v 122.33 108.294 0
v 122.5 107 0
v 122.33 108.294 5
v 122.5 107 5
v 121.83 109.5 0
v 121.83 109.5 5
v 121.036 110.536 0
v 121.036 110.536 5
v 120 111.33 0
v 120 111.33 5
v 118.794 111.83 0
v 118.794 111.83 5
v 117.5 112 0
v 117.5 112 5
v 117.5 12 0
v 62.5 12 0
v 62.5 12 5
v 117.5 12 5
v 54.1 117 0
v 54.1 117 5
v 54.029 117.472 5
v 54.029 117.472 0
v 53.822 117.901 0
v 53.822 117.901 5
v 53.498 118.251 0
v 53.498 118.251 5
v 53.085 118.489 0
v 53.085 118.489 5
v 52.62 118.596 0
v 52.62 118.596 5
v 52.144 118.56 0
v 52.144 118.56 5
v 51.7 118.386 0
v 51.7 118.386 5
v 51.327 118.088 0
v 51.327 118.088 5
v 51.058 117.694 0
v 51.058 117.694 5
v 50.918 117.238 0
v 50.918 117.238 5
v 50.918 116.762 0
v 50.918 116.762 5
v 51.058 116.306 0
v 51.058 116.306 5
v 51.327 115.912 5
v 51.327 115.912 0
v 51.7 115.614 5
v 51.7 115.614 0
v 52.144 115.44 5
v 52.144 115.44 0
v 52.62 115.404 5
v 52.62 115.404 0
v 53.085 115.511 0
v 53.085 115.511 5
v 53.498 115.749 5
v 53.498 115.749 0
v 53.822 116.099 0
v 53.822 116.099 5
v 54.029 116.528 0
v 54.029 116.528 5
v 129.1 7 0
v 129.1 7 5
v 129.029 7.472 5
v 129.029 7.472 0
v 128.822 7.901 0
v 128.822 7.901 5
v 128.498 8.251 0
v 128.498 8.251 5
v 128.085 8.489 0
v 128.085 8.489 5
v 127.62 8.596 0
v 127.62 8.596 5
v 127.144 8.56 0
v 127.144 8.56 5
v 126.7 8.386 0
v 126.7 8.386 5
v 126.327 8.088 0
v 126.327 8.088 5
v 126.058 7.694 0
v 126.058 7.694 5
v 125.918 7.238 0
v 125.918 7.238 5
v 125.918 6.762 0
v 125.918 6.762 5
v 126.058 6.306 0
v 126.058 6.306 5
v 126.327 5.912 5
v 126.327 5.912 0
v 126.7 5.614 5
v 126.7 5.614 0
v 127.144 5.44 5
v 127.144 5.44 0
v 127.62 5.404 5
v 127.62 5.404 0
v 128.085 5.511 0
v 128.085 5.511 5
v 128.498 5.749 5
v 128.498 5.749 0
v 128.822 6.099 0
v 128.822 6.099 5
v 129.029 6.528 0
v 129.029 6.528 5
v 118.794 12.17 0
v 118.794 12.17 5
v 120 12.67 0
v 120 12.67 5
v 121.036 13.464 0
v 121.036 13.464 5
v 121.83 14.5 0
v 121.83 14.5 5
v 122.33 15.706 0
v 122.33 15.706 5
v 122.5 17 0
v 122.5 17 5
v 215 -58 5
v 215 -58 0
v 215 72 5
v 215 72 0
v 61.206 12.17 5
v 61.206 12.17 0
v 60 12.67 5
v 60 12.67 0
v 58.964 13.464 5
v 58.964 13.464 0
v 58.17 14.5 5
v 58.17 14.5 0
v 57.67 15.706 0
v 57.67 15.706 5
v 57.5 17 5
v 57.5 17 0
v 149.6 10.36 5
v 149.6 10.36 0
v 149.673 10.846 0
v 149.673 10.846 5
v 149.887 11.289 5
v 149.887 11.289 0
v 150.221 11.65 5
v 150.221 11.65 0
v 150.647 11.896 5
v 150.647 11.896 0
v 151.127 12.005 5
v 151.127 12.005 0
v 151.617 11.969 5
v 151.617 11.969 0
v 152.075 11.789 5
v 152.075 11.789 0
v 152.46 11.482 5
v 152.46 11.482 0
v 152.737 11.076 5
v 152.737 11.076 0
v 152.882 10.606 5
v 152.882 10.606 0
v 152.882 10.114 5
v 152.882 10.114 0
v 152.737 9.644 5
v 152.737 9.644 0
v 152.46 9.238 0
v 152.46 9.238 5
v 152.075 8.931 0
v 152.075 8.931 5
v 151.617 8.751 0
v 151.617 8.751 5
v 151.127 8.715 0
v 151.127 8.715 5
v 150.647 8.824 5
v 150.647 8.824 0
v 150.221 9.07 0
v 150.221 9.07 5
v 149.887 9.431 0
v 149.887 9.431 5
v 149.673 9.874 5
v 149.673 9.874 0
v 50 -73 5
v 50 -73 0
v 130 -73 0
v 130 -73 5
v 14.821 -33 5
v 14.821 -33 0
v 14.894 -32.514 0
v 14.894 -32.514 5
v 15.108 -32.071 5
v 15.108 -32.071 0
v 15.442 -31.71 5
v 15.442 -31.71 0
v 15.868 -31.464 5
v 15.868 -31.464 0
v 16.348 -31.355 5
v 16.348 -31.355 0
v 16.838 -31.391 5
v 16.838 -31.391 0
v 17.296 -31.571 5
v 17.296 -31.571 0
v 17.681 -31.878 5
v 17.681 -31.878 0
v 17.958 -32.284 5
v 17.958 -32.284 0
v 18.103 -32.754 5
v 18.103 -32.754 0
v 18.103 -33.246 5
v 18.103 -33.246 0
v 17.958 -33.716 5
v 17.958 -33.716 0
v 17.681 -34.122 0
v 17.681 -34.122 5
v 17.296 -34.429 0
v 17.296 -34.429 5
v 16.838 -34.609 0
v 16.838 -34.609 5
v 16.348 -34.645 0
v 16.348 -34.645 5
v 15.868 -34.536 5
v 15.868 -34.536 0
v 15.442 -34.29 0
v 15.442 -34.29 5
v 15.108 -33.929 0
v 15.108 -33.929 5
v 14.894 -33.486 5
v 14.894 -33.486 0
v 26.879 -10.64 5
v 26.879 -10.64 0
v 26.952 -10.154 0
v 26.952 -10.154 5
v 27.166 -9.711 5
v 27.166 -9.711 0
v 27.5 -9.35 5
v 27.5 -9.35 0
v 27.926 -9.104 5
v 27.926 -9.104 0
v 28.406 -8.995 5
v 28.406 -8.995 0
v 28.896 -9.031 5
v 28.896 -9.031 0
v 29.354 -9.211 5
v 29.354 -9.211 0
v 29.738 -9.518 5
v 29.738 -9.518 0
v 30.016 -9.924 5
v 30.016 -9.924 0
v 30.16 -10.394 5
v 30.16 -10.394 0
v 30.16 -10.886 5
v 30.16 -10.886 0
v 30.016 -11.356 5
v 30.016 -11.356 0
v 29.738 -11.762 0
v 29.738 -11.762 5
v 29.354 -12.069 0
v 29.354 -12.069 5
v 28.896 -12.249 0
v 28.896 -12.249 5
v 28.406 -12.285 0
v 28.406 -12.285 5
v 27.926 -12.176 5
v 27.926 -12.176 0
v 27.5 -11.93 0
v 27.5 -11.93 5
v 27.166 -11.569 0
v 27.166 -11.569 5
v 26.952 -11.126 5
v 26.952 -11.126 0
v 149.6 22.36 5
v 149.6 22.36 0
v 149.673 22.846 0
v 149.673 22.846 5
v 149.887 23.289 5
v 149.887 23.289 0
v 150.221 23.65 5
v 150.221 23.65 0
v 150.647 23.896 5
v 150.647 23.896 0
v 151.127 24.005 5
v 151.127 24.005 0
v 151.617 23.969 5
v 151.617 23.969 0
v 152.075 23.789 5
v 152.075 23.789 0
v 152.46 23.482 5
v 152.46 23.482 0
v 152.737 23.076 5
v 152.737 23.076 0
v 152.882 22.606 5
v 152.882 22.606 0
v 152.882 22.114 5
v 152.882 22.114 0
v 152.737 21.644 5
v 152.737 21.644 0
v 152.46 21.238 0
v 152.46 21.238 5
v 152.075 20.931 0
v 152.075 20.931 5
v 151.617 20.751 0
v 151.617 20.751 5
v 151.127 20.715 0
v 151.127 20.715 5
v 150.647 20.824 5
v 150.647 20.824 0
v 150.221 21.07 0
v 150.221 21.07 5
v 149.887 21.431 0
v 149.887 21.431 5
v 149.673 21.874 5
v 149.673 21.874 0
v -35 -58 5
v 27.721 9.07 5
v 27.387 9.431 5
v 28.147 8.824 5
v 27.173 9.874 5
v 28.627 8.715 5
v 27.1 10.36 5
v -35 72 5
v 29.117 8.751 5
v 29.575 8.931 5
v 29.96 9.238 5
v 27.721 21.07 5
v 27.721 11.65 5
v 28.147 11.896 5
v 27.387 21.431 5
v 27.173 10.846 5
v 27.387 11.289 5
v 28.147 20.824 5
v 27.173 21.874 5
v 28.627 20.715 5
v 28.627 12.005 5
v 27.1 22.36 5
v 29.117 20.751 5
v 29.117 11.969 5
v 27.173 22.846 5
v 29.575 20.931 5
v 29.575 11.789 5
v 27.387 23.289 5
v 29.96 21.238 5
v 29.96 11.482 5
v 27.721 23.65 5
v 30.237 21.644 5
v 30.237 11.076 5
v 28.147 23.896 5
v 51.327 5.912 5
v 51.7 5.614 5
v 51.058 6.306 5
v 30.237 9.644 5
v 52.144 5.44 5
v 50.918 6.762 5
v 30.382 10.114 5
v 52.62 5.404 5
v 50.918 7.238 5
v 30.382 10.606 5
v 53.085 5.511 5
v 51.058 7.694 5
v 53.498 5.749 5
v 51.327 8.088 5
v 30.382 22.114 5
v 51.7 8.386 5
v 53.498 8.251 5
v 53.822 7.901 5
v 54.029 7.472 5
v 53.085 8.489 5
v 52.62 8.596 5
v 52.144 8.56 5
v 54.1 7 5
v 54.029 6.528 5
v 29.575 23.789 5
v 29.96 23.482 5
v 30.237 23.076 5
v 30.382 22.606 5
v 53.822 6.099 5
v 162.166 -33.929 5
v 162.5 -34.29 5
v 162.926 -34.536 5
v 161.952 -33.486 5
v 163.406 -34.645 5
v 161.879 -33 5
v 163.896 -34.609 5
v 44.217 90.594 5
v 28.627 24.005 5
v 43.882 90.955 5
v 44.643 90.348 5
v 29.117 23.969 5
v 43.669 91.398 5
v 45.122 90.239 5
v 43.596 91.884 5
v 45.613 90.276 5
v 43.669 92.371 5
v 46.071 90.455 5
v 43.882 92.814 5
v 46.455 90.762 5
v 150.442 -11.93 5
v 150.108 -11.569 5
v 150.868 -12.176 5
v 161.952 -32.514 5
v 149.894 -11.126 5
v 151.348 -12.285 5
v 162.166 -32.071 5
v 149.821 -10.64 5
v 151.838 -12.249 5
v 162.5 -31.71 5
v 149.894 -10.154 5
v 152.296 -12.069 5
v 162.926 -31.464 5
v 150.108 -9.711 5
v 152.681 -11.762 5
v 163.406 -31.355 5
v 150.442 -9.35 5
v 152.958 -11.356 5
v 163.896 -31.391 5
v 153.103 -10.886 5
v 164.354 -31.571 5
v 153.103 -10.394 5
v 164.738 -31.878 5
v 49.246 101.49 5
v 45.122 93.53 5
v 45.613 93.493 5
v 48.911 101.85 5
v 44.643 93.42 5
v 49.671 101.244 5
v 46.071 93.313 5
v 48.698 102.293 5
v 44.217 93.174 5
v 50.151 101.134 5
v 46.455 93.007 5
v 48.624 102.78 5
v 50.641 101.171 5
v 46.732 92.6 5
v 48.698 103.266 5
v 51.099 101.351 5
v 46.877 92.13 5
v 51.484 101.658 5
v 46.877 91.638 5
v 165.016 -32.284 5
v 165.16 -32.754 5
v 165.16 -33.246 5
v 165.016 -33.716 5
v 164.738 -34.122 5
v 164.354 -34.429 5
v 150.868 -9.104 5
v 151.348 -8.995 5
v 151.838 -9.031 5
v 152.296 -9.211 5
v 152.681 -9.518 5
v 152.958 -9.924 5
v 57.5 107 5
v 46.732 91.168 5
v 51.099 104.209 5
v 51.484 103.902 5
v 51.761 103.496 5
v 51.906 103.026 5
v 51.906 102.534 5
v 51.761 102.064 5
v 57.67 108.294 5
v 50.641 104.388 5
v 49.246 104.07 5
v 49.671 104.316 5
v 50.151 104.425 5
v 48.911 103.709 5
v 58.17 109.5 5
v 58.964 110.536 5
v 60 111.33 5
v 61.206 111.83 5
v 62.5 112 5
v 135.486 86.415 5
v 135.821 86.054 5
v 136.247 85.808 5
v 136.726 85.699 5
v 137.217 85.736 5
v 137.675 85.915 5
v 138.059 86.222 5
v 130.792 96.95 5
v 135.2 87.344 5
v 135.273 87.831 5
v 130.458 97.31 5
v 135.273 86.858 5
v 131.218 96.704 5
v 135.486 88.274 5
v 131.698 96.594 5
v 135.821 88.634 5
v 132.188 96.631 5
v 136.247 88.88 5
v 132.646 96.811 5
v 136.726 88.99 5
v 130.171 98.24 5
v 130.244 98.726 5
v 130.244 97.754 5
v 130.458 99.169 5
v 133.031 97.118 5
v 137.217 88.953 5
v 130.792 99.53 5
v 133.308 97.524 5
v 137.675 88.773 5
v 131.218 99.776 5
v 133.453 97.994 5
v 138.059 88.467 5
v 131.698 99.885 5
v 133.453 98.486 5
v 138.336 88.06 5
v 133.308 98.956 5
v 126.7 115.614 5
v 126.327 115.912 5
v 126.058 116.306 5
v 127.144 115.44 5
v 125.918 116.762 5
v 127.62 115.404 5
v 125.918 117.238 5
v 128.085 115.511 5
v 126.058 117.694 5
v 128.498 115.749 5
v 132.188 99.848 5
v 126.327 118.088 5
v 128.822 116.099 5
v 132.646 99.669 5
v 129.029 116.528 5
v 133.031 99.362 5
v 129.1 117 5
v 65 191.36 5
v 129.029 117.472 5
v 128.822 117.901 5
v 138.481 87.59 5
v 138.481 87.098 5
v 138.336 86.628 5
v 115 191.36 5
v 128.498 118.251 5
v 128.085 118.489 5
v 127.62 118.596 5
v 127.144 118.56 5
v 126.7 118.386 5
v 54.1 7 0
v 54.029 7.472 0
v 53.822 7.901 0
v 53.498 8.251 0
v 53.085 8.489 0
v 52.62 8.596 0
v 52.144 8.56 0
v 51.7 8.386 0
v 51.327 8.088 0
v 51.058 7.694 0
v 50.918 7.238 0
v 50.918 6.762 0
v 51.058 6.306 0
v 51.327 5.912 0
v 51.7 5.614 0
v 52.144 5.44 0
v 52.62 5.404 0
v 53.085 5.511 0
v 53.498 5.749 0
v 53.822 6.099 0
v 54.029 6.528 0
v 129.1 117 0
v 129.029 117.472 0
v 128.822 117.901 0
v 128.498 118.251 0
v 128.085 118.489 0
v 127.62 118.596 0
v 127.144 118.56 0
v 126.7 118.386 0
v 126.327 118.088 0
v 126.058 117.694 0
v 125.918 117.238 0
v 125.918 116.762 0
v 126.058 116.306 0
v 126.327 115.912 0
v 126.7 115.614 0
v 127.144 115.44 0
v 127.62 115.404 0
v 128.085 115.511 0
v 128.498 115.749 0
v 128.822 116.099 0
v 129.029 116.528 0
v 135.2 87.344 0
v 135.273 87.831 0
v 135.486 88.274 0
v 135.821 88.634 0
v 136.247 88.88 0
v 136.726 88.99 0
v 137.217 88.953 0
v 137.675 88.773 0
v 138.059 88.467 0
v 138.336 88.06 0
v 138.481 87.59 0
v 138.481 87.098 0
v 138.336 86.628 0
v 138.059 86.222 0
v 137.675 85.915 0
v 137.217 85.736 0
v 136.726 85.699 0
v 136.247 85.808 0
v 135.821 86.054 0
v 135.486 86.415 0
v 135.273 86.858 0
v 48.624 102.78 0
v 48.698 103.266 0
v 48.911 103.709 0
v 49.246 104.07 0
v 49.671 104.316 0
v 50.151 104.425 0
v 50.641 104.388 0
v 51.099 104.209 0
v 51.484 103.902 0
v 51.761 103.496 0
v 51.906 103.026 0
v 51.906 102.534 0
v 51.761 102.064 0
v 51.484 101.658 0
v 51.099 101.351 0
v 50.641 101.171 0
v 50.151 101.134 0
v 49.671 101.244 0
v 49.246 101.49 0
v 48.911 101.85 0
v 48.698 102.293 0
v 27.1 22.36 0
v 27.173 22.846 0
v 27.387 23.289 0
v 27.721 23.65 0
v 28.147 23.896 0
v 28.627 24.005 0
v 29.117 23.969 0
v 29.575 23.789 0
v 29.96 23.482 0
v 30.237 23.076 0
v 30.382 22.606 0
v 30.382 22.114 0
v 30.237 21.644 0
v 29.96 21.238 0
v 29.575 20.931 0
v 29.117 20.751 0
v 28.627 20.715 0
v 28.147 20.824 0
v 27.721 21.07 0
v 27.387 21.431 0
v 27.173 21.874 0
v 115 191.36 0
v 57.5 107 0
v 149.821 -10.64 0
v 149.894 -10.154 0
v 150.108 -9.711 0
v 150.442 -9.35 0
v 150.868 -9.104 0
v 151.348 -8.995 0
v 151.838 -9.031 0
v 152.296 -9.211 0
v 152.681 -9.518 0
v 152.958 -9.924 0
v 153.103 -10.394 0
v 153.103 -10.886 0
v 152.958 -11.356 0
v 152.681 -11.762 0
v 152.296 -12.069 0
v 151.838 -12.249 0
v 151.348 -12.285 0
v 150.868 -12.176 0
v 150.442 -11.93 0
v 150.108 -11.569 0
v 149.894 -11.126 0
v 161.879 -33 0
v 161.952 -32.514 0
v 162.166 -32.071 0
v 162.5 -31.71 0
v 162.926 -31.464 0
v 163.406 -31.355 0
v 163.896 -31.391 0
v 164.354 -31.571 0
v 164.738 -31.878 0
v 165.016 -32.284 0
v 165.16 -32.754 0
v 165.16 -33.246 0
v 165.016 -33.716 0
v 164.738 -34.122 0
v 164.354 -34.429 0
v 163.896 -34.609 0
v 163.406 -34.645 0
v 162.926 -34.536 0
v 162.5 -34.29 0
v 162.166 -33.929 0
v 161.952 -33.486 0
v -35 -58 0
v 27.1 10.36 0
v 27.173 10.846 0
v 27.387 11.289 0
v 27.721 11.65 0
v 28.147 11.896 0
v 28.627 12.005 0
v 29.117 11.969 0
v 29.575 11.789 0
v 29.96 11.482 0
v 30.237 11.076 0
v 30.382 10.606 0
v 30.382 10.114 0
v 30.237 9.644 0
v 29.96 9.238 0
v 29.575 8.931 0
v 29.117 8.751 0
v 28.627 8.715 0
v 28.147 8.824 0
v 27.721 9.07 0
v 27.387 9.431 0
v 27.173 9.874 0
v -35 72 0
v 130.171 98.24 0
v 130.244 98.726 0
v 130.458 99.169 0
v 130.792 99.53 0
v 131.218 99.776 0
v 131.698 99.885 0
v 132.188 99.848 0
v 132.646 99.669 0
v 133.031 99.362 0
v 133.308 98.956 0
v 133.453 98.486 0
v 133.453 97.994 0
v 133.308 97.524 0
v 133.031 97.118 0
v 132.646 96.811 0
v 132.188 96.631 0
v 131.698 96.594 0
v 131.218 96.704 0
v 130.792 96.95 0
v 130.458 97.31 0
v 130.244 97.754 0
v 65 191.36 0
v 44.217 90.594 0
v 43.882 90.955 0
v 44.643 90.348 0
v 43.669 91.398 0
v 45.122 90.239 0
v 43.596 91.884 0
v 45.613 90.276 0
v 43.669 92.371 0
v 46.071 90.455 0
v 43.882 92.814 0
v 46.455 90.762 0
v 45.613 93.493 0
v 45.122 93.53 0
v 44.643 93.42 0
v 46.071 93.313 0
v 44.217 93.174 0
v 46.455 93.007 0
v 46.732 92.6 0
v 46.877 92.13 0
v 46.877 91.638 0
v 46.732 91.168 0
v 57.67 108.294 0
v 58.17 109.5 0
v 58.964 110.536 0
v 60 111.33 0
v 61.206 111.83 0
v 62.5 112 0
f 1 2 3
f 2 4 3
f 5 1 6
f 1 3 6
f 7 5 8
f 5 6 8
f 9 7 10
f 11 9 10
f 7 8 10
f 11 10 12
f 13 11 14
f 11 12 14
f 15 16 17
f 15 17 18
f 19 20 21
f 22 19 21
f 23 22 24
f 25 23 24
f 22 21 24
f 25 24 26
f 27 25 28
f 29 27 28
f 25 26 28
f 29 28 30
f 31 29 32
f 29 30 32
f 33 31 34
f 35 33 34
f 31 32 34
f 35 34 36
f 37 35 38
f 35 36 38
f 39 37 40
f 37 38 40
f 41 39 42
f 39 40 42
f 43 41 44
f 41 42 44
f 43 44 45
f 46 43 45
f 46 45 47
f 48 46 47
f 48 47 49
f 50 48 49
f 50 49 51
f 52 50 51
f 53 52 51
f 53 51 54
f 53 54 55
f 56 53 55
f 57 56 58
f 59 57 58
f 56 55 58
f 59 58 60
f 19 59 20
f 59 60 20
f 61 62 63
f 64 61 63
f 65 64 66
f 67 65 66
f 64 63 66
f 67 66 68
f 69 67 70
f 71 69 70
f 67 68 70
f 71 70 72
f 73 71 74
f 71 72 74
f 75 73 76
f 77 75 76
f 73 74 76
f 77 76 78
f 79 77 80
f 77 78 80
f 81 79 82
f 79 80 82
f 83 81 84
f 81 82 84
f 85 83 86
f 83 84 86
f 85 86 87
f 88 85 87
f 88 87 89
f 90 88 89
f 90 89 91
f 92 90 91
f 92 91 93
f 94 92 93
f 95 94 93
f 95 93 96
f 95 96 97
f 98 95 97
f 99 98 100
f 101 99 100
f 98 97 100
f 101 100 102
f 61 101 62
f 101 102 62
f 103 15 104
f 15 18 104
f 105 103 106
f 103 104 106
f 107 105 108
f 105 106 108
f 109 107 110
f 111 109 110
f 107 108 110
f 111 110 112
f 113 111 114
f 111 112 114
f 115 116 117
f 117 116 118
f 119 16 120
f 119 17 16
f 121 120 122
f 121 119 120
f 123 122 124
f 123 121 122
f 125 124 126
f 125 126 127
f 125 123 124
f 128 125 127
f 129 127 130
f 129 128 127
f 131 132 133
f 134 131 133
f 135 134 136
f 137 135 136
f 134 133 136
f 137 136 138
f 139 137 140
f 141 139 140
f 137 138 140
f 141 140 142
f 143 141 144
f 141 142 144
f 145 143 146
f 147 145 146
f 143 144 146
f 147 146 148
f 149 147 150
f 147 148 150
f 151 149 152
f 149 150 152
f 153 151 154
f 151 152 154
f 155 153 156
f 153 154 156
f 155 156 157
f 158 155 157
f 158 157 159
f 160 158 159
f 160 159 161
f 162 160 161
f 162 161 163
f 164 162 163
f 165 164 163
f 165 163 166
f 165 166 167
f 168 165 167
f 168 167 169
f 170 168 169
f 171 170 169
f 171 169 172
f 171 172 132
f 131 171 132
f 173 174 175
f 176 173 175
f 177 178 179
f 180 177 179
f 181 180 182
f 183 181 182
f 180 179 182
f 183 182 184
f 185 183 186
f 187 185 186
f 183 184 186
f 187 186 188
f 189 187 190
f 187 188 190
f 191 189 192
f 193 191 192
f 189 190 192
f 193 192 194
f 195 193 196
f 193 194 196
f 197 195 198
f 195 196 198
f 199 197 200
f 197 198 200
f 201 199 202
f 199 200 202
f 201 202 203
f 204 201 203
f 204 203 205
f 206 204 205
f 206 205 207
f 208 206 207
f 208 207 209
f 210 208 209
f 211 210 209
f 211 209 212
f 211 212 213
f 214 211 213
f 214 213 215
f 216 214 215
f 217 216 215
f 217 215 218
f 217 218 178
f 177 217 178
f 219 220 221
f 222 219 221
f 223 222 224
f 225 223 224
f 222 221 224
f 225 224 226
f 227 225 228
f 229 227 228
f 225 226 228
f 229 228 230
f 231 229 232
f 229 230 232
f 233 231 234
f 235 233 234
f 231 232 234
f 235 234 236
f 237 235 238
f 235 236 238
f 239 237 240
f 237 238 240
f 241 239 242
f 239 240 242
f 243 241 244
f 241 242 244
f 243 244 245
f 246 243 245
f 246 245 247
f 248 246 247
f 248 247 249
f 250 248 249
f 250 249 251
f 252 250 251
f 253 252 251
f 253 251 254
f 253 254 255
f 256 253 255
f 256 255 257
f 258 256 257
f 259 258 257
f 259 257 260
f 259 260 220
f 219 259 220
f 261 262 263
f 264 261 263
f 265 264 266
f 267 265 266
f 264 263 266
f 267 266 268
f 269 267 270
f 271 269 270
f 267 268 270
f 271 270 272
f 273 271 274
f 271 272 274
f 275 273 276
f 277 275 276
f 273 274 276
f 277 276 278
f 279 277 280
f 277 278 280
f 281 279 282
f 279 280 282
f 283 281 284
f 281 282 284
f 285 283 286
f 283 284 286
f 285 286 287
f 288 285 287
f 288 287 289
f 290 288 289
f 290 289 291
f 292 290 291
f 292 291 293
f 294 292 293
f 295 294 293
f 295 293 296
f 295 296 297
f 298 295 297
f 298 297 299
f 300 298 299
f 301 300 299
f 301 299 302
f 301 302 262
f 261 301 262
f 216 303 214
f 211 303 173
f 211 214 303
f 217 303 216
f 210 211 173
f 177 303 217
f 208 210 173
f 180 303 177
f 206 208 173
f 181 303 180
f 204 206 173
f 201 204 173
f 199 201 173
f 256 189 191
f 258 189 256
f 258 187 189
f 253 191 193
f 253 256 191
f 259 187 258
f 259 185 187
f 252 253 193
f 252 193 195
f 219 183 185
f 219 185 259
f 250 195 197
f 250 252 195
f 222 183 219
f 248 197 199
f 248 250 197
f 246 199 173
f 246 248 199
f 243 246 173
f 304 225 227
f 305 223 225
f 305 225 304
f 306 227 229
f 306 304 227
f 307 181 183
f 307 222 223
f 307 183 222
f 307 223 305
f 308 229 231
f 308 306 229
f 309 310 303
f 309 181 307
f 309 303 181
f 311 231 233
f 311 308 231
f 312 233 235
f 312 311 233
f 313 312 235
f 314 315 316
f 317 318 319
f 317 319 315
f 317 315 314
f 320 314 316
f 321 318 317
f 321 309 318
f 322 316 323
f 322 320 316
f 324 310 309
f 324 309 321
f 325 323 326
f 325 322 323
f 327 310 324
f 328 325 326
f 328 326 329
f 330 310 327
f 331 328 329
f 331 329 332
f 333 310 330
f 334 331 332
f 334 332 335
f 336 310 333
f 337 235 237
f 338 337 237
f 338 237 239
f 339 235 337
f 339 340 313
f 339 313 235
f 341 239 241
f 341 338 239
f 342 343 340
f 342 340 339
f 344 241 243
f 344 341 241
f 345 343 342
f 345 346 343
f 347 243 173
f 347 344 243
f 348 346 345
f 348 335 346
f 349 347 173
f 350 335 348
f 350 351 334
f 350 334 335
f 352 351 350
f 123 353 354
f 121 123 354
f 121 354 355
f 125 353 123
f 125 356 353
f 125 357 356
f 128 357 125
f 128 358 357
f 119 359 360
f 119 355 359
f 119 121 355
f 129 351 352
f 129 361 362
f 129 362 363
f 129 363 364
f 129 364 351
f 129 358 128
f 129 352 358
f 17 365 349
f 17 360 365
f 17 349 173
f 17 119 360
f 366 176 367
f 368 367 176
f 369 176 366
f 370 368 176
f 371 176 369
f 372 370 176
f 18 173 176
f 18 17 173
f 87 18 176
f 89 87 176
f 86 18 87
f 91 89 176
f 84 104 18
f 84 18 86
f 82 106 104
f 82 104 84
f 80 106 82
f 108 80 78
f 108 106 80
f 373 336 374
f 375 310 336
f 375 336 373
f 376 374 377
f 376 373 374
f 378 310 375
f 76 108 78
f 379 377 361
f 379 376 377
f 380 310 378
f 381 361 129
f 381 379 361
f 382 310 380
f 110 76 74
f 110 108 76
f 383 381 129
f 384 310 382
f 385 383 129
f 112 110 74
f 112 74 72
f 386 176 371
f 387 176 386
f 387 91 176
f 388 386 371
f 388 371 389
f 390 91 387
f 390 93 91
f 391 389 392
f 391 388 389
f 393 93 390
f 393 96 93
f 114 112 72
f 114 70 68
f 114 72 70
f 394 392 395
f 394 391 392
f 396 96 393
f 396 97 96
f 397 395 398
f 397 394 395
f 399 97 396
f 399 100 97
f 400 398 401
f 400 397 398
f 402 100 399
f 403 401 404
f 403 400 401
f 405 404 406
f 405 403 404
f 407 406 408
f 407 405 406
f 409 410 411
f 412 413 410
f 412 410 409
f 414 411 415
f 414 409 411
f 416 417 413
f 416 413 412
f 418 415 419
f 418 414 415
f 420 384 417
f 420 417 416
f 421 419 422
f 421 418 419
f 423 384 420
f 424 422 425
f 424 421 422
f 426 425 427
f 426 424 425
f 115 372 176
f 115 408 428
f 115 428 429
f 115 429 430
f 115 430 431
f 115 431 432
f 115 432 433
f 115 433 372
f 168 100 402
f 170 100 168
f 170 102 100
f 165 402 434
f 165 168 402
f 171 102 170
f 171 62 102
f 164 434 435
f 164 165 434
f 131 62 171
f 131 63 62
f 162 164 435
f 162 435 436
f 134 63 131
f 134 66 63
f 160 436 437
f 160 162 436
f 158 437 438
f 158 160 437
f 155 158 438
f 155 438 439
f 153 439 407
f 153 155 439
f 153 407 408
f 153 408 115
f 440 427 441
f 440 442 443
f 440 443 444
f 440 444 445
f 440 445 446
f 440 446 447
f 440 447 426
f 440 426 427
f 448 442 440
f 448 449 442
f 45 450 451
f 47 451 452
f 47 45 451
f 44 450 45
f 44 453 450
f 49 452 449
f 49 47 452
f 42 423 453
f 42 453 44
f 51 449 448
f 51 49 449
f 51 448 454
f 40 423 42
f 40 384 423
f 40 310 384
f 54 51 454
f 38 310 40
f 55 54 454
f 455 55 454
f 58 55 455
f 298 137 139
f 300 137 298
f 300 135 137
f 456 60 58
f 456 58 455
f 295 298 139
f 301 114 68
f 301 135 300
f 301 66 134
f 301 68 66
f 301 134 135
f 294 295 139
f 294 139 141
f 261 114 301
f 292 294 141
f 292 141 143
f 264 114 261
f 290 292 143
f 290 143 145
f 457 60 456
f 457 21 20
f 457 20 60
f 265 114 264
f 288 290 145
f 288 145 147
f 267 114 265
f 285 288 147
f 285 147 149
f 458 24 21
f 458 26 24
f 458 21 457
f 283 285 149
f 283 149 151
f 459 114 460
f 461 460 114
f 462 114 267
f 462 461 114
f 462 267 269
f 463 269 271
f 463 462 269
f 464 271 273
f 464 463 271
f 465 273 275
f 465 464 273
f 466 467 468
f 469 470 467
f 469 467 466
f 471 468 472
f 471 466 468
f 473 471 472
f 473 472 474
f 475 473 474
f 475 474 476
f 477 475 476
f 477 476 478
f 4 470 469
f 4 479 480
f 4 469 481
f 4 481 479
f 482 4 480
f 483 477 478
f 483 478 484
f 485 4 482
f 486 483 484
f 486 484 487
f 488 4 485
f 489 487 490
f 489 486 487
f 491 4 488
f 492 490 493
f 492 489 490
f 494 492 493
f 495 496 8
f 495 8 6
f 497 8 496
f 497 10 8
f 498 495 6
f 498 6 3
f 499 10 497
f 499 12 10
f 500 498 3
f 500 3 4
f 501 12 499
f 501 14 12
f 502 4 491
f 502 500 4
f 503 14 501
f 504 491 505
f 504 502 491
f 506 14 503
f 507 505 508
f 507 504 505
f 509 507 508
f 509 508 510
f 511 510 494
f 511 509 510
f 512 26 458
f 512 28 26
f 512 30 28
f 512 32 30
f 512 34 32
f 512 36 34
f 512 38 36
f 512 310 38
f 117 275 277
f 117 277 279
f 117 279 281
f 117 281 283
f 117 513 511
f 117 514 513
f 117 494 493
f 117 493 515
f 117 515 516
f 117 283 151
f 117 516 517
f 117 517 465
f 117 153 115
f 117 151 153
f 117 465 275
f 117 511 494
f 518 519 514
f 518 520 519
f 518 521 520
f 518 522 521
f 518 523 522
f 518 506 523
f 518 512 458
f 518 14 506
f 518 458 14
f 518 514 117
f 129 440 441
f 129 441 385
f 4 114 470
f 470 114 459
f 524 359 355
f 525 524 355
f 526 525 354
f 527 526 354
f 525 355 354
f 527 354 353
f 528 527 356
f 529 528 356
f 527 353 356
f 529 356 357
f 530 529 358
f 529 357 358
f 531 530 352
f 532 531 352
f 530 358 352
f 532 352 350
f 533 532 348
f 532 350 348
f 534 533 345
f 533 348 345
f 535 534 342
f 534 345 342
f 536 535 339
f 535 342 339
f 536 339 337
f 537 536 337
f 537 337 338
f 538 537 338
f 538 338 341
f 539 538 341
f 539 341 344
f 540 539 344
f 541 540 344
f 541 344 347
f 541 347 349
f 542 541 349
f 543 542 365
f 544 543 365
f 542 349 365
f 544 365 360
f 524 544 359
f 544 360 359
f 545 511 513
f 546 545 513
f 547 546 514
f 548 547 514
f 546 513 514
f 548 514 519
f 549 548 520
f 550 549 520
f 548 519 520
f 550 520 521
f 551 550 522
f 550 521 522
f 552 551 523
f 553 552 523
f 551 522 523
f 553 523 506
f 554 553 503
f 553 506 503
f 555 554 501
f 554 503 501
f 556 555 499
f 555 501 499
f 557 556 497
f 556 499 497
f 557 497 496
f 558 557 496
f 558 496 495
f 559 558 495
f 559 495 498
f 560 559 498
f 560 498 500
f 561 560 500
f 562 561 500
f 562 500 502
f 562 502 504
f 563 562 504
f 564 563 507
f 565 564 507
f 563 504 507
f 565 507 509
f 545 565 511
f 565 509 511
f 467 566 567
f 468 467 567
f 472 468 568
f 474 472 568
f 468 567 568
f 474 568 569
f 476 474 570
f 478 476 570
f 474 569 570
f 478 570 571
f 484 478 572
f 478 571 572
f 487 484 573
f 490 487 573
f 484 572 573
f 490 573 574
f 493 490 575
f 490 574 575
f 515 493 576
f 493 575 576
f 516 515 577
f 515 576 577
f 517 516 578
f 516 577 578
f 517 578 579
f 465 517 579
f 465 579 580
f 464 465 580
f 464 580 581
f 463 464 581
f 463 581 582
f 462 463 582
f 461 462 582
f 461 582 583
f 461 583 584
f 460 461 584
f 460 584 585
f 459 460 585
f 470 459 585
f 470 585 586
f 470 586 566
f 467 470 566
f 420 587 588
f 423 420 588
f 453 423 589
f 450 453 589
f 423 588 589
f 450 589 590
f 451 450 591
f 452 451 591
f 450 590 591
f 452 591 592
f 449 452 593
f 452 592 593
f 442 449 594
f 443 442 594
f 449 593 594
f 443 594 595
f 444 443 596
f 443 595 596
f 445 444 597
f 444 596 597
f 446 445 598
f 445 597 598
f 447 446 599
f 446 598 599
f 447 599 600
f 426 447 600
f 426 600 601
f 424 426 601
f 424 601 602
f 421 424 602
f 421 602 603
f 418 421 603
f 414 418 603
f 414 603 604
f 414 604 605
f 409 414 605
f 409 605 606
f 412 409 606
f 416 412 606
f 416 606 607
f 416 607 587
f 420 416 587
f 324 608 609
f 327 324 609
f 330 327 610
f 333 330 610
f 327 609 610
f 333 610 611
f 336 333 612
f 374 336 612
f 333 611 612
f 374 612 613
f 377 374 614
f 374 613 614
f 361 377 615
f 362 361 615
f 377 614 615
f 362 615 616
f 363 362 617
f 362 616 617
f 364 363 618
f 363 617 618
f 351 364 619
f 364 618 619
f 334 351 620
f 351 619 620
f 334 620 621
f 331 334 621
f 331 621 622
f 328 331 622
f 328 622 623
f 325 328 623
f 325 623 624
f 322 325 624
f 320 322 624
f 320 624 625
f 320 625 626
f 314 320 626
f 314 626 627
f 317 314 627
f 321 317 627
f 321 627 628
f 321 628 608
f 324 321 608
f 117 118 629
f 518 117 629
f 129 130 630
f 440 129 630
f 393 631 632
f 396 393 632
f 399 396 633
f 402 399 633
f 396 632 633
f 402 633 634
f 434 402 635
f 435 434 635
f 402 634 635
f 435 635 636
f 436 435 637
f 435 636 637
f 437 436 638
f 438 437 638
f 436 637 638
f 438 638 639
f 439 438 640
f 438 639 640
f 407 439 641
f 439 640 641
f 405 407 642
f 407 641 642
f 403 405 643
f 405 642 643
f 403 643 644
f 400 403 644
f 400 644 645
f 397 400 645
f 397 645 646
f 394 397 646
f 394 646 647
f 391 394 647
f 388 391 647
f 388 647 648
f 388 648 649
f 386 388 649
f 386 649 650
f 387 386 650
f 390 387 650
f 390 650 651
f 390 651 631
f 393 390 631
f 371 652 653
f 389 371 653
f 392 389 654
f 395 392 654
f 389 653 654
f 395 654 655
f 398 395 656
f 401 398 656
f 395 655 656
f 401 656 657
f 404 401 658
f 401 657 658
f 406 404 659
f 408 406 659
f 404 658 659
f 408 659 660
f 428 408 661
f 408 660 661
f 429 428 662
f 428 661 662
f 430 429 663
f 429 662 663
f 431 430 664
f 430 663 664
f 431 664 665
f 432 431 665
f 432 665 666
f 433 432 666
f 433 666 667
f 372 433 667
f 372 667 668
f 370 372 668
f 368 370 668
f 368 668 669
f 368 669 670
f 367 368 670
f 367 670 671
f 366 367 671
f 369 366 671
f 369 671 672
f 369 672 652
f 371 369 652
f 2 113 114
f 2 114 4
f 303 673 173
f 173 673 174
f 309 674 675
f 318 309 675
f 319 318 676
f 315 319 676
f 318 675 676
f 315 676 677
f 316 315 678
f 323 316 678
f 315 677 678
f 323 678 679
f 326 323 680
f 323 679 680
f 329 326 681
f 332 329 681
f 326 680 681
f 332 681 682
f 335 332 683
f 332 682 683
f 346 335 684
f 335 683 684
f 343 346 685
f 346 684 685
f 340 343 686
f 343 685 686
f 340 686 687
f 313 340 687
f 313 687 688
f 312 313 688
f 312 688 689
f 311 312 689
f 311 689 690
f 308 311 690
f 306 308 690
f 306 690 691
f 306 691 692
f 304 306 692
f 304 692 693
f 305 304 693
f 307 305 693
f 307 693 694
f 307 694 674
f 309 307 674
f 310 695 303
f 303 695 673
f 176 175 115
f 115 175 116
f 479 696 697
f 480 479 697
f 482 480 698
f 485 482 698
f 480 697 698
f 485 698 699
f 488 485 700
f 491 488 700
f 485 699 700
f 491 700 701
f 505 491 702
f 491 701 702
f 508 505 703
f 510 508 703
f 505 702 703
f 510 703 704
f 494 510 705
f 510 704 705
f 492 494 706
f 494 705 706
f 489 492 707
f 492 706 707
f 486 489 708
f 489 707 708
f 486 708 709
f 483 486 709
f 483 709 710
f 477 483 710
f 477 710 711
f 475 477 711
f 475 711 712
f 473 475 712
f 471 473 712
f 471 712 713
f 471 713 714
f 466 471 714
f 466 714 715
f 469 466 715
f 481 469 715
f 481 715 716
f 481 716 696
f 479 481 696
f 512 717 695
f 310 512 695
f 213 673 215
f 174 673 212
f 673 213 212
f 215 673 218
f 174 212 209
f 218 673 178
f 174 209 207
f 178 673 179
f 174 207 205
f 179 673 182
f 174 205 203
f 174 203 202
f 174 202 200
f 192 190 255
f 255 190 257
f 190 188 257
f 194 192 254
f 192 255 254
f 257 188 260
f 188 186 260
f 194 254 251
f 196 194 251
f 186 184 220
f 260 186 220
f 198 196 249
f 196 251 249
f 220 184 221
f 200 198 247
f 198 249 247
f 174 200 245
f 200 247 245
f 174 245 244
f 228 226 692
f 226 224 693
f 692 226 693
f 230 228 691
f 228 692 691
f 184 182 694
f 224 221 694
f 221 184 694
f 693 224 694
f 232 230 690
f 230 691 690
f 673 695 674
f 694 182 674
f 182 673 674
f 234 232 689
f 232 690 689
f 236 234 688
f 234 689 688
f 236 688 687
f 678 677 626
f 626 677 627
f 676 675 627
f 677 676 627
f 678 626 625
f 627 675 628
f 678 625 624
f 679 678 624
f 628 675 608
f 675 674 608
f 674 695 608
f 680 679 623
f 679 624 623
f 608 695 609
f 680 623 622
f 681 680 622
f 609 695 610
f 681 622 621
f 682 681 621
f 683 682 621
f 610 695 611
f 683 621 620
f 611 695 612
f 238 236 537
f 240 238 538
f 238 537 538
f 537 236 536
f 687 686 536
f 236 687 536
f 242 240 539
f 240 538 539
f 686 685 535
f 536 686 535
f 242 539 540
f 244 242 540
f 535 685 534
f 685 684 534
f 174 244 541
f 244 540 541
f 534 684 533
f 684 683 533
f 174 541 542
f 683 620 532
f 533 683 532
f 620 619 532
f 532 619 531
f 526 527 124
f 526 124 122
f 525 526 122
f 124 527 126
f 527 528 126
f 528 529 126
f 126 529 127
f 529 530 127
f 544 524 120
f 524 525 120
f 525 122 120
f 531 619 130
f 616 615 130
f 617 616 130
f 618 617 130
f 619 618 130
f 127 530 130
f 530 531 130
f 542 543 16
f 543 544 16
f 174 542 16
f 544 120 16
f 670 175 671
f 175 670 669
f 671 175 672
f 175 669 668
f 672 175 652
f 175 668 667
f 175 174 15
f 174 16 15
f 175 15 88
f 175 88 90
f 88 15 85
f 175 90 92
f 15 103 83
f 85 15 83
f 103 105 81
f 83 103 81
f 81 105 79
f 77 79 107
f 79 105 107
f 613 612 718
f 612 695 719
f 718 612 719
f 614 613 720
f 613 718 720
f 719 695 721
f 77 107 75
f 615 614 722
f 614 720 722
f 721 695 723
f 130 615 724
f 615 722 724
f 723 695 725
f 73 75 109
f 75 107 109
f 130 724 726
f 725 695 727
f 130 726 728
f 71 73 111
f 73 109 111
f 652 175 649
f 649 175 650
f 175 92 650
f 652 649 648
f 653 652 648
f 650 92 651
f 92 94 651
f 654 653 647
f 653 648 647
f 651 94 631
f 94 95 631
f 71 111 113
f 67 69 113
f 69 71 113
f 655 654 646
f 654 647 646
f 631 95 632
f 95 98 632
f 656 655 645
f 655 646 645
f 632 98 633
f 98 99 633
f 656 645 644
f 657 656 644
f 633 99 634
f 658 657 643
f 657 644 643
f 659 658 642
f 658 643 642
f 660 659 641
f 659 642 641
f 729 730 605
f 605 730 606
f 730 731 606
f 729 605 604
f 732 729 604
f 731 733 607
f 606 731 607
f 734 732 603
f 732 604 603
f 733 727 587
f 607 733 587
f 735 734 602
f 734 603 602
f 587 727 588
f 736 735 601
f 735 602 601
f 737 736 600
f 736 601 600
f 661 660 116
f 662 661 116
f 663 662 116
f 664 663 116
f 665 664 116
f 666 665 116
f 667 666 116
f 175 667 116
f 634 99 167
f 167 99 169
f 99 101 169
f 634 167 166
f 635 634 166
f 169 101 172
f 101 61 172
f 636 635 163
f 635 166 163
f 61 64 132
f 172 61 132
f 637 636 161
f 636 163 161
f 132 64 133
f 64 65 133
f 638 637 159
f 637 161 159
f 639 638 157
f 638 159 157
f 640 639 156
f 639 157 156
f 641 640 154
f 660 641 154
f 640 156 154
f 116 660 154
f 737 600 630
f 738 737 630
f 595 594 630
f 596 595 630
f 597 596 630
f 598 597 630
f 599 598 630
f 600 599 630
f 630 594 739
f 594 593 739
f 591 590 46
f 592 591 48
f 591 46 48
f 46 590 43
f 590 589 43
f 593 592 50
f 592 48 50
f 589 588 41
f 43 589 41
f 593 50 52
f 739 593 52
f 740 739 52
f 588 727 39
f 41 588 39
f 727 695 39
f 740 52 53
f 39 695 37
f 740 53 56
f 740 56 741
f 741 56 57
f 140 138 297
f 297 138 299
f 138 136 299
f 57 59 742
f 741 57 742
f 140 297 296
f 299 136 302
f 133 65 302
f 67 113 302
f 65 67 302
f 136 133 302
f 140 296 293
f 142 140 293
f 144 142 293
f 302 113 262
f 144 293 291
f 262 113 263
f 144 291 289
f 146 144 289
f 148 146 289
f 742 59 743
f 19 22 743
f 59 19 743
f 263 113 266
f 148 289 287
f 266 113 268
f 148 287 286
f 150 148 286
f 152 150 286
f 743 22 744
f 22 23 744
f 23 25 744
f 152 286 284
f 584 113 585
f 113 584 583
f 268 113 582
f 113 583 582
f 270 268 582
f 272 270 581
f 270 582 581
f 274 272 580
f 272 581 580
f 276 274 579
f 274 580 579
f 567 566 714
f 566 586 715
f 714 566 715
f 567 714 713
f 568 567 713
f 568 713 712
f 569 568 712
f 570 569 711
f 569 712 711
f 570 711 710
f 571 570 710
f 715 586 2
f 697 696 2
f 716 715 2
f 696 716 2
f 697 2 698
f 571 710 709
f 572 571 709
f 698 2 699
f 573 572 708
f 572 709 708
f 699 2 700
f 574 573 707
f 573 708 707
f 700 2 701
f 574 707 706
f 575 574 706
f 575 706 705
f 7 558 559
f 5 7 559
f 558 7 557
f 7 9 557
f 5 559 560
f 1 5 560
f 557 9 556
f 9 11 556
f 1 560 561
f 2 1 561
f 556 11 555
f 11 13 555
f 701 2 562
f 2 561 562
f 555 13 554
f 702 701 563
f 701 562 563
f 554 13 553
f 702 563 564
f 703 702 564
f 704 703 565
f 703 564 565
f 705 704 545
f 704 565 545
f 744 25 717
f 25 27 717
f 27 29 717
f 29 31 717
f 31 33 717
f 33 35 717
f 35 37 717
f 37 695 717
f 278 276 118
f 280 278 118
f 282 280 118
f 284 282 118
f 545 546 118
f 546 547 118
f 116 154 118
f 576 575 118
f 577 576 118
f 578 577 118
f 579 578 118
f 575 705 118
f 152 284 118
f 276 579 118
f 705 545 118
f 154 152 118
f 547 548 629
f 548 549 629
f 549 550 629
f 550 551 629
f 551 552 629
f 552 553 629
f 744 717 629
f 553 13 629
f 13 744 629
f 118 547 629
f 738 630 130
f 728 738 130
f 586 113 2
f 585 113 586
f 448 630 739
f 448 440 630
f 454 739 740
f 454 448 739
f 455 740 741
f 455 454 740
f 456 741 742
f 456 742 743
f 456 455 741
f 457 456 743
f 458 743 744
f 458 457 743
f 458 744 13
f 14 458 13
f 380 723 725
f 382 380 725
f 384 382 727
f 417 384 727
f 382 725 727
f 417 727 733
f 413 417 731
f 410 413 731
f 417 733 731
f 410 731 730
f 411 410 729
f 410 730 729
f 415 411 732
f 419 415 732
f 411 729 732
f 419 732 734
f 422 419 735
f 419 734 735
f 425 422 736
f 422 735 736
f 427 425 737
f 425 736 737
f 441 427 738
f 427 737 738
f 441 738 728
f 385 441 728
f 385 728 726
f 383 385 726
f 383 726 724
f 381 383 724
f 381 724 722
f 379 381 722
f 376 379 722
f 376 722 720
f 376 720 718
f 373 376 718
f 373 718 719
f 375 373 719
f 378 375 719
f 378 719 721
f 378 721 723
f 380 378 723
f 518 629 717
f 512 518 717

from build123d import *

# Parameters (mm, degrees)
SKETCH_1_W                  = 65
SKETCH_1_H                  = 100
EXTRUDE_1_DEPTH             = 5
SKETCH_2_R                  = 1.6
CUT_EXTRUDE_1_DEPTH         = 5
PATTERN_LINEAR_1_COUNT      = 2
PATTERN_LINEAR_1_PITCH      = 75
PATTERN_LINEAR_1_COUNT_DIR2 = 2
PATTERN_LINEAR_1_PITCH_DIR2 = 110
FILLET_1_R                  = 5
SKETCH_4_R                  = 1.65
CUT_EXTRUDE_2_DEPTH         = 31


with BuildPart() as part:
    # Эскиз1 → Бобышка-Вытянуть1 (new body)
    with BuildSketch(Plane.XY):
        Polygon((-35, -48), (-35, -58), (50, -73), (130, -73), (215, -58), (215, -48), (215, 62), (215, 72), (115, 191.360256276), (65, 191.360256276), (-35, 72), (-35, 62), align=None)
        with Locations((90, 62)):
            Rectangle(SKETCH_1_W, SKETCH_1_H, mode=Mode.SUBTRACT)
    extrude(amount=EXTRUDE_1_DEPTH)

    # Эскиз2 → Вырез-Вытянуть1 (cut)
    with BuildSketch(Plane.XY.offset(5)):
        with Locations((52.5, 7)):
            Circle(SKETCH_2_R)
    cut_extrude_1 = extrude(amount=-CUT_EXTRUDE_1_DEPTH, mode=Mode.SUBTRACT)

    # Линейный массив1: Cut-Extrude 1 2 × 2
    with Locations(*[(i * PATTERN_LINEAR_1_PITCH, j * PATTERN_LINEAR_1_PITCH_DIR2, 0) for i in range(PATTERN_LINEAR_1_COUNT) for j in range(PATTERN_LINEAR_1_COUNT_DIR2) if (i, j) != (0, 0)]):
        add(cut_extrude_1, mode=Mode.SUBTRACT)

    # Скругление1
    fillet_1_edges = [part.edges().sort_by_distance(p)[0] for p in [
        (122.5, 112, 2.5),
        (57.5, 112, 2.5),
        (57.5, 12, 2.5),
        (122.5, 12, 2.5),
    ]]
    fillet(fillet_1_edges, radius=FILLET_1_R)

    # Эскиз4 → Вырез-Вытянуть2 (cut)
    with BuildSketch(Plane(origin=(0, 0, 0), x_dir=(-1, 0, 0), z_dir=(0, 0, -1))):
        with Locations((-16.471095772, -33)):
            Circle(SKETCH_4_R)
        with Locations((-28.528904228, -10.64)):
            Circle(SKETCH_4_R)
        with Locations((-28.75, 22.36)):
            Circle(SKETCH_4_R)
        with Locations((-28.75, 10.36)):
            Circle(SKETCH_4_R)
        with Locations((-45.245579603, 91.884303707)):
            Circle(SKETCH_4_R)
        with Locations((-50.274277733, 102.779816321)):
            Circle(SKETCH_4_R)
        with Locations((-131.821084869, 98.239864017)):
            Circle(SKETCH_4_R)
        with Locations((-136.849782999, 87.344351403)):
            Circle(SKETCH_4_R)
        with Locations((-151.471095772, -10.64)):
            Circle(SKETCH_4_R)
        with Locations((-163.528904228, -33)):
            Circle(SKETCH_4_R)
        with Locations((-151.25, 22.36)):
            Circle(SKETCH_4_R)
        with Locations((-151.25, 10.36)):
            Circle(SKETCH_4_R)
    extrude(amount=-CUT_EXTRUDE_2_DEPTH, mode=Mode.SUBTRACT)


solid = part.part
